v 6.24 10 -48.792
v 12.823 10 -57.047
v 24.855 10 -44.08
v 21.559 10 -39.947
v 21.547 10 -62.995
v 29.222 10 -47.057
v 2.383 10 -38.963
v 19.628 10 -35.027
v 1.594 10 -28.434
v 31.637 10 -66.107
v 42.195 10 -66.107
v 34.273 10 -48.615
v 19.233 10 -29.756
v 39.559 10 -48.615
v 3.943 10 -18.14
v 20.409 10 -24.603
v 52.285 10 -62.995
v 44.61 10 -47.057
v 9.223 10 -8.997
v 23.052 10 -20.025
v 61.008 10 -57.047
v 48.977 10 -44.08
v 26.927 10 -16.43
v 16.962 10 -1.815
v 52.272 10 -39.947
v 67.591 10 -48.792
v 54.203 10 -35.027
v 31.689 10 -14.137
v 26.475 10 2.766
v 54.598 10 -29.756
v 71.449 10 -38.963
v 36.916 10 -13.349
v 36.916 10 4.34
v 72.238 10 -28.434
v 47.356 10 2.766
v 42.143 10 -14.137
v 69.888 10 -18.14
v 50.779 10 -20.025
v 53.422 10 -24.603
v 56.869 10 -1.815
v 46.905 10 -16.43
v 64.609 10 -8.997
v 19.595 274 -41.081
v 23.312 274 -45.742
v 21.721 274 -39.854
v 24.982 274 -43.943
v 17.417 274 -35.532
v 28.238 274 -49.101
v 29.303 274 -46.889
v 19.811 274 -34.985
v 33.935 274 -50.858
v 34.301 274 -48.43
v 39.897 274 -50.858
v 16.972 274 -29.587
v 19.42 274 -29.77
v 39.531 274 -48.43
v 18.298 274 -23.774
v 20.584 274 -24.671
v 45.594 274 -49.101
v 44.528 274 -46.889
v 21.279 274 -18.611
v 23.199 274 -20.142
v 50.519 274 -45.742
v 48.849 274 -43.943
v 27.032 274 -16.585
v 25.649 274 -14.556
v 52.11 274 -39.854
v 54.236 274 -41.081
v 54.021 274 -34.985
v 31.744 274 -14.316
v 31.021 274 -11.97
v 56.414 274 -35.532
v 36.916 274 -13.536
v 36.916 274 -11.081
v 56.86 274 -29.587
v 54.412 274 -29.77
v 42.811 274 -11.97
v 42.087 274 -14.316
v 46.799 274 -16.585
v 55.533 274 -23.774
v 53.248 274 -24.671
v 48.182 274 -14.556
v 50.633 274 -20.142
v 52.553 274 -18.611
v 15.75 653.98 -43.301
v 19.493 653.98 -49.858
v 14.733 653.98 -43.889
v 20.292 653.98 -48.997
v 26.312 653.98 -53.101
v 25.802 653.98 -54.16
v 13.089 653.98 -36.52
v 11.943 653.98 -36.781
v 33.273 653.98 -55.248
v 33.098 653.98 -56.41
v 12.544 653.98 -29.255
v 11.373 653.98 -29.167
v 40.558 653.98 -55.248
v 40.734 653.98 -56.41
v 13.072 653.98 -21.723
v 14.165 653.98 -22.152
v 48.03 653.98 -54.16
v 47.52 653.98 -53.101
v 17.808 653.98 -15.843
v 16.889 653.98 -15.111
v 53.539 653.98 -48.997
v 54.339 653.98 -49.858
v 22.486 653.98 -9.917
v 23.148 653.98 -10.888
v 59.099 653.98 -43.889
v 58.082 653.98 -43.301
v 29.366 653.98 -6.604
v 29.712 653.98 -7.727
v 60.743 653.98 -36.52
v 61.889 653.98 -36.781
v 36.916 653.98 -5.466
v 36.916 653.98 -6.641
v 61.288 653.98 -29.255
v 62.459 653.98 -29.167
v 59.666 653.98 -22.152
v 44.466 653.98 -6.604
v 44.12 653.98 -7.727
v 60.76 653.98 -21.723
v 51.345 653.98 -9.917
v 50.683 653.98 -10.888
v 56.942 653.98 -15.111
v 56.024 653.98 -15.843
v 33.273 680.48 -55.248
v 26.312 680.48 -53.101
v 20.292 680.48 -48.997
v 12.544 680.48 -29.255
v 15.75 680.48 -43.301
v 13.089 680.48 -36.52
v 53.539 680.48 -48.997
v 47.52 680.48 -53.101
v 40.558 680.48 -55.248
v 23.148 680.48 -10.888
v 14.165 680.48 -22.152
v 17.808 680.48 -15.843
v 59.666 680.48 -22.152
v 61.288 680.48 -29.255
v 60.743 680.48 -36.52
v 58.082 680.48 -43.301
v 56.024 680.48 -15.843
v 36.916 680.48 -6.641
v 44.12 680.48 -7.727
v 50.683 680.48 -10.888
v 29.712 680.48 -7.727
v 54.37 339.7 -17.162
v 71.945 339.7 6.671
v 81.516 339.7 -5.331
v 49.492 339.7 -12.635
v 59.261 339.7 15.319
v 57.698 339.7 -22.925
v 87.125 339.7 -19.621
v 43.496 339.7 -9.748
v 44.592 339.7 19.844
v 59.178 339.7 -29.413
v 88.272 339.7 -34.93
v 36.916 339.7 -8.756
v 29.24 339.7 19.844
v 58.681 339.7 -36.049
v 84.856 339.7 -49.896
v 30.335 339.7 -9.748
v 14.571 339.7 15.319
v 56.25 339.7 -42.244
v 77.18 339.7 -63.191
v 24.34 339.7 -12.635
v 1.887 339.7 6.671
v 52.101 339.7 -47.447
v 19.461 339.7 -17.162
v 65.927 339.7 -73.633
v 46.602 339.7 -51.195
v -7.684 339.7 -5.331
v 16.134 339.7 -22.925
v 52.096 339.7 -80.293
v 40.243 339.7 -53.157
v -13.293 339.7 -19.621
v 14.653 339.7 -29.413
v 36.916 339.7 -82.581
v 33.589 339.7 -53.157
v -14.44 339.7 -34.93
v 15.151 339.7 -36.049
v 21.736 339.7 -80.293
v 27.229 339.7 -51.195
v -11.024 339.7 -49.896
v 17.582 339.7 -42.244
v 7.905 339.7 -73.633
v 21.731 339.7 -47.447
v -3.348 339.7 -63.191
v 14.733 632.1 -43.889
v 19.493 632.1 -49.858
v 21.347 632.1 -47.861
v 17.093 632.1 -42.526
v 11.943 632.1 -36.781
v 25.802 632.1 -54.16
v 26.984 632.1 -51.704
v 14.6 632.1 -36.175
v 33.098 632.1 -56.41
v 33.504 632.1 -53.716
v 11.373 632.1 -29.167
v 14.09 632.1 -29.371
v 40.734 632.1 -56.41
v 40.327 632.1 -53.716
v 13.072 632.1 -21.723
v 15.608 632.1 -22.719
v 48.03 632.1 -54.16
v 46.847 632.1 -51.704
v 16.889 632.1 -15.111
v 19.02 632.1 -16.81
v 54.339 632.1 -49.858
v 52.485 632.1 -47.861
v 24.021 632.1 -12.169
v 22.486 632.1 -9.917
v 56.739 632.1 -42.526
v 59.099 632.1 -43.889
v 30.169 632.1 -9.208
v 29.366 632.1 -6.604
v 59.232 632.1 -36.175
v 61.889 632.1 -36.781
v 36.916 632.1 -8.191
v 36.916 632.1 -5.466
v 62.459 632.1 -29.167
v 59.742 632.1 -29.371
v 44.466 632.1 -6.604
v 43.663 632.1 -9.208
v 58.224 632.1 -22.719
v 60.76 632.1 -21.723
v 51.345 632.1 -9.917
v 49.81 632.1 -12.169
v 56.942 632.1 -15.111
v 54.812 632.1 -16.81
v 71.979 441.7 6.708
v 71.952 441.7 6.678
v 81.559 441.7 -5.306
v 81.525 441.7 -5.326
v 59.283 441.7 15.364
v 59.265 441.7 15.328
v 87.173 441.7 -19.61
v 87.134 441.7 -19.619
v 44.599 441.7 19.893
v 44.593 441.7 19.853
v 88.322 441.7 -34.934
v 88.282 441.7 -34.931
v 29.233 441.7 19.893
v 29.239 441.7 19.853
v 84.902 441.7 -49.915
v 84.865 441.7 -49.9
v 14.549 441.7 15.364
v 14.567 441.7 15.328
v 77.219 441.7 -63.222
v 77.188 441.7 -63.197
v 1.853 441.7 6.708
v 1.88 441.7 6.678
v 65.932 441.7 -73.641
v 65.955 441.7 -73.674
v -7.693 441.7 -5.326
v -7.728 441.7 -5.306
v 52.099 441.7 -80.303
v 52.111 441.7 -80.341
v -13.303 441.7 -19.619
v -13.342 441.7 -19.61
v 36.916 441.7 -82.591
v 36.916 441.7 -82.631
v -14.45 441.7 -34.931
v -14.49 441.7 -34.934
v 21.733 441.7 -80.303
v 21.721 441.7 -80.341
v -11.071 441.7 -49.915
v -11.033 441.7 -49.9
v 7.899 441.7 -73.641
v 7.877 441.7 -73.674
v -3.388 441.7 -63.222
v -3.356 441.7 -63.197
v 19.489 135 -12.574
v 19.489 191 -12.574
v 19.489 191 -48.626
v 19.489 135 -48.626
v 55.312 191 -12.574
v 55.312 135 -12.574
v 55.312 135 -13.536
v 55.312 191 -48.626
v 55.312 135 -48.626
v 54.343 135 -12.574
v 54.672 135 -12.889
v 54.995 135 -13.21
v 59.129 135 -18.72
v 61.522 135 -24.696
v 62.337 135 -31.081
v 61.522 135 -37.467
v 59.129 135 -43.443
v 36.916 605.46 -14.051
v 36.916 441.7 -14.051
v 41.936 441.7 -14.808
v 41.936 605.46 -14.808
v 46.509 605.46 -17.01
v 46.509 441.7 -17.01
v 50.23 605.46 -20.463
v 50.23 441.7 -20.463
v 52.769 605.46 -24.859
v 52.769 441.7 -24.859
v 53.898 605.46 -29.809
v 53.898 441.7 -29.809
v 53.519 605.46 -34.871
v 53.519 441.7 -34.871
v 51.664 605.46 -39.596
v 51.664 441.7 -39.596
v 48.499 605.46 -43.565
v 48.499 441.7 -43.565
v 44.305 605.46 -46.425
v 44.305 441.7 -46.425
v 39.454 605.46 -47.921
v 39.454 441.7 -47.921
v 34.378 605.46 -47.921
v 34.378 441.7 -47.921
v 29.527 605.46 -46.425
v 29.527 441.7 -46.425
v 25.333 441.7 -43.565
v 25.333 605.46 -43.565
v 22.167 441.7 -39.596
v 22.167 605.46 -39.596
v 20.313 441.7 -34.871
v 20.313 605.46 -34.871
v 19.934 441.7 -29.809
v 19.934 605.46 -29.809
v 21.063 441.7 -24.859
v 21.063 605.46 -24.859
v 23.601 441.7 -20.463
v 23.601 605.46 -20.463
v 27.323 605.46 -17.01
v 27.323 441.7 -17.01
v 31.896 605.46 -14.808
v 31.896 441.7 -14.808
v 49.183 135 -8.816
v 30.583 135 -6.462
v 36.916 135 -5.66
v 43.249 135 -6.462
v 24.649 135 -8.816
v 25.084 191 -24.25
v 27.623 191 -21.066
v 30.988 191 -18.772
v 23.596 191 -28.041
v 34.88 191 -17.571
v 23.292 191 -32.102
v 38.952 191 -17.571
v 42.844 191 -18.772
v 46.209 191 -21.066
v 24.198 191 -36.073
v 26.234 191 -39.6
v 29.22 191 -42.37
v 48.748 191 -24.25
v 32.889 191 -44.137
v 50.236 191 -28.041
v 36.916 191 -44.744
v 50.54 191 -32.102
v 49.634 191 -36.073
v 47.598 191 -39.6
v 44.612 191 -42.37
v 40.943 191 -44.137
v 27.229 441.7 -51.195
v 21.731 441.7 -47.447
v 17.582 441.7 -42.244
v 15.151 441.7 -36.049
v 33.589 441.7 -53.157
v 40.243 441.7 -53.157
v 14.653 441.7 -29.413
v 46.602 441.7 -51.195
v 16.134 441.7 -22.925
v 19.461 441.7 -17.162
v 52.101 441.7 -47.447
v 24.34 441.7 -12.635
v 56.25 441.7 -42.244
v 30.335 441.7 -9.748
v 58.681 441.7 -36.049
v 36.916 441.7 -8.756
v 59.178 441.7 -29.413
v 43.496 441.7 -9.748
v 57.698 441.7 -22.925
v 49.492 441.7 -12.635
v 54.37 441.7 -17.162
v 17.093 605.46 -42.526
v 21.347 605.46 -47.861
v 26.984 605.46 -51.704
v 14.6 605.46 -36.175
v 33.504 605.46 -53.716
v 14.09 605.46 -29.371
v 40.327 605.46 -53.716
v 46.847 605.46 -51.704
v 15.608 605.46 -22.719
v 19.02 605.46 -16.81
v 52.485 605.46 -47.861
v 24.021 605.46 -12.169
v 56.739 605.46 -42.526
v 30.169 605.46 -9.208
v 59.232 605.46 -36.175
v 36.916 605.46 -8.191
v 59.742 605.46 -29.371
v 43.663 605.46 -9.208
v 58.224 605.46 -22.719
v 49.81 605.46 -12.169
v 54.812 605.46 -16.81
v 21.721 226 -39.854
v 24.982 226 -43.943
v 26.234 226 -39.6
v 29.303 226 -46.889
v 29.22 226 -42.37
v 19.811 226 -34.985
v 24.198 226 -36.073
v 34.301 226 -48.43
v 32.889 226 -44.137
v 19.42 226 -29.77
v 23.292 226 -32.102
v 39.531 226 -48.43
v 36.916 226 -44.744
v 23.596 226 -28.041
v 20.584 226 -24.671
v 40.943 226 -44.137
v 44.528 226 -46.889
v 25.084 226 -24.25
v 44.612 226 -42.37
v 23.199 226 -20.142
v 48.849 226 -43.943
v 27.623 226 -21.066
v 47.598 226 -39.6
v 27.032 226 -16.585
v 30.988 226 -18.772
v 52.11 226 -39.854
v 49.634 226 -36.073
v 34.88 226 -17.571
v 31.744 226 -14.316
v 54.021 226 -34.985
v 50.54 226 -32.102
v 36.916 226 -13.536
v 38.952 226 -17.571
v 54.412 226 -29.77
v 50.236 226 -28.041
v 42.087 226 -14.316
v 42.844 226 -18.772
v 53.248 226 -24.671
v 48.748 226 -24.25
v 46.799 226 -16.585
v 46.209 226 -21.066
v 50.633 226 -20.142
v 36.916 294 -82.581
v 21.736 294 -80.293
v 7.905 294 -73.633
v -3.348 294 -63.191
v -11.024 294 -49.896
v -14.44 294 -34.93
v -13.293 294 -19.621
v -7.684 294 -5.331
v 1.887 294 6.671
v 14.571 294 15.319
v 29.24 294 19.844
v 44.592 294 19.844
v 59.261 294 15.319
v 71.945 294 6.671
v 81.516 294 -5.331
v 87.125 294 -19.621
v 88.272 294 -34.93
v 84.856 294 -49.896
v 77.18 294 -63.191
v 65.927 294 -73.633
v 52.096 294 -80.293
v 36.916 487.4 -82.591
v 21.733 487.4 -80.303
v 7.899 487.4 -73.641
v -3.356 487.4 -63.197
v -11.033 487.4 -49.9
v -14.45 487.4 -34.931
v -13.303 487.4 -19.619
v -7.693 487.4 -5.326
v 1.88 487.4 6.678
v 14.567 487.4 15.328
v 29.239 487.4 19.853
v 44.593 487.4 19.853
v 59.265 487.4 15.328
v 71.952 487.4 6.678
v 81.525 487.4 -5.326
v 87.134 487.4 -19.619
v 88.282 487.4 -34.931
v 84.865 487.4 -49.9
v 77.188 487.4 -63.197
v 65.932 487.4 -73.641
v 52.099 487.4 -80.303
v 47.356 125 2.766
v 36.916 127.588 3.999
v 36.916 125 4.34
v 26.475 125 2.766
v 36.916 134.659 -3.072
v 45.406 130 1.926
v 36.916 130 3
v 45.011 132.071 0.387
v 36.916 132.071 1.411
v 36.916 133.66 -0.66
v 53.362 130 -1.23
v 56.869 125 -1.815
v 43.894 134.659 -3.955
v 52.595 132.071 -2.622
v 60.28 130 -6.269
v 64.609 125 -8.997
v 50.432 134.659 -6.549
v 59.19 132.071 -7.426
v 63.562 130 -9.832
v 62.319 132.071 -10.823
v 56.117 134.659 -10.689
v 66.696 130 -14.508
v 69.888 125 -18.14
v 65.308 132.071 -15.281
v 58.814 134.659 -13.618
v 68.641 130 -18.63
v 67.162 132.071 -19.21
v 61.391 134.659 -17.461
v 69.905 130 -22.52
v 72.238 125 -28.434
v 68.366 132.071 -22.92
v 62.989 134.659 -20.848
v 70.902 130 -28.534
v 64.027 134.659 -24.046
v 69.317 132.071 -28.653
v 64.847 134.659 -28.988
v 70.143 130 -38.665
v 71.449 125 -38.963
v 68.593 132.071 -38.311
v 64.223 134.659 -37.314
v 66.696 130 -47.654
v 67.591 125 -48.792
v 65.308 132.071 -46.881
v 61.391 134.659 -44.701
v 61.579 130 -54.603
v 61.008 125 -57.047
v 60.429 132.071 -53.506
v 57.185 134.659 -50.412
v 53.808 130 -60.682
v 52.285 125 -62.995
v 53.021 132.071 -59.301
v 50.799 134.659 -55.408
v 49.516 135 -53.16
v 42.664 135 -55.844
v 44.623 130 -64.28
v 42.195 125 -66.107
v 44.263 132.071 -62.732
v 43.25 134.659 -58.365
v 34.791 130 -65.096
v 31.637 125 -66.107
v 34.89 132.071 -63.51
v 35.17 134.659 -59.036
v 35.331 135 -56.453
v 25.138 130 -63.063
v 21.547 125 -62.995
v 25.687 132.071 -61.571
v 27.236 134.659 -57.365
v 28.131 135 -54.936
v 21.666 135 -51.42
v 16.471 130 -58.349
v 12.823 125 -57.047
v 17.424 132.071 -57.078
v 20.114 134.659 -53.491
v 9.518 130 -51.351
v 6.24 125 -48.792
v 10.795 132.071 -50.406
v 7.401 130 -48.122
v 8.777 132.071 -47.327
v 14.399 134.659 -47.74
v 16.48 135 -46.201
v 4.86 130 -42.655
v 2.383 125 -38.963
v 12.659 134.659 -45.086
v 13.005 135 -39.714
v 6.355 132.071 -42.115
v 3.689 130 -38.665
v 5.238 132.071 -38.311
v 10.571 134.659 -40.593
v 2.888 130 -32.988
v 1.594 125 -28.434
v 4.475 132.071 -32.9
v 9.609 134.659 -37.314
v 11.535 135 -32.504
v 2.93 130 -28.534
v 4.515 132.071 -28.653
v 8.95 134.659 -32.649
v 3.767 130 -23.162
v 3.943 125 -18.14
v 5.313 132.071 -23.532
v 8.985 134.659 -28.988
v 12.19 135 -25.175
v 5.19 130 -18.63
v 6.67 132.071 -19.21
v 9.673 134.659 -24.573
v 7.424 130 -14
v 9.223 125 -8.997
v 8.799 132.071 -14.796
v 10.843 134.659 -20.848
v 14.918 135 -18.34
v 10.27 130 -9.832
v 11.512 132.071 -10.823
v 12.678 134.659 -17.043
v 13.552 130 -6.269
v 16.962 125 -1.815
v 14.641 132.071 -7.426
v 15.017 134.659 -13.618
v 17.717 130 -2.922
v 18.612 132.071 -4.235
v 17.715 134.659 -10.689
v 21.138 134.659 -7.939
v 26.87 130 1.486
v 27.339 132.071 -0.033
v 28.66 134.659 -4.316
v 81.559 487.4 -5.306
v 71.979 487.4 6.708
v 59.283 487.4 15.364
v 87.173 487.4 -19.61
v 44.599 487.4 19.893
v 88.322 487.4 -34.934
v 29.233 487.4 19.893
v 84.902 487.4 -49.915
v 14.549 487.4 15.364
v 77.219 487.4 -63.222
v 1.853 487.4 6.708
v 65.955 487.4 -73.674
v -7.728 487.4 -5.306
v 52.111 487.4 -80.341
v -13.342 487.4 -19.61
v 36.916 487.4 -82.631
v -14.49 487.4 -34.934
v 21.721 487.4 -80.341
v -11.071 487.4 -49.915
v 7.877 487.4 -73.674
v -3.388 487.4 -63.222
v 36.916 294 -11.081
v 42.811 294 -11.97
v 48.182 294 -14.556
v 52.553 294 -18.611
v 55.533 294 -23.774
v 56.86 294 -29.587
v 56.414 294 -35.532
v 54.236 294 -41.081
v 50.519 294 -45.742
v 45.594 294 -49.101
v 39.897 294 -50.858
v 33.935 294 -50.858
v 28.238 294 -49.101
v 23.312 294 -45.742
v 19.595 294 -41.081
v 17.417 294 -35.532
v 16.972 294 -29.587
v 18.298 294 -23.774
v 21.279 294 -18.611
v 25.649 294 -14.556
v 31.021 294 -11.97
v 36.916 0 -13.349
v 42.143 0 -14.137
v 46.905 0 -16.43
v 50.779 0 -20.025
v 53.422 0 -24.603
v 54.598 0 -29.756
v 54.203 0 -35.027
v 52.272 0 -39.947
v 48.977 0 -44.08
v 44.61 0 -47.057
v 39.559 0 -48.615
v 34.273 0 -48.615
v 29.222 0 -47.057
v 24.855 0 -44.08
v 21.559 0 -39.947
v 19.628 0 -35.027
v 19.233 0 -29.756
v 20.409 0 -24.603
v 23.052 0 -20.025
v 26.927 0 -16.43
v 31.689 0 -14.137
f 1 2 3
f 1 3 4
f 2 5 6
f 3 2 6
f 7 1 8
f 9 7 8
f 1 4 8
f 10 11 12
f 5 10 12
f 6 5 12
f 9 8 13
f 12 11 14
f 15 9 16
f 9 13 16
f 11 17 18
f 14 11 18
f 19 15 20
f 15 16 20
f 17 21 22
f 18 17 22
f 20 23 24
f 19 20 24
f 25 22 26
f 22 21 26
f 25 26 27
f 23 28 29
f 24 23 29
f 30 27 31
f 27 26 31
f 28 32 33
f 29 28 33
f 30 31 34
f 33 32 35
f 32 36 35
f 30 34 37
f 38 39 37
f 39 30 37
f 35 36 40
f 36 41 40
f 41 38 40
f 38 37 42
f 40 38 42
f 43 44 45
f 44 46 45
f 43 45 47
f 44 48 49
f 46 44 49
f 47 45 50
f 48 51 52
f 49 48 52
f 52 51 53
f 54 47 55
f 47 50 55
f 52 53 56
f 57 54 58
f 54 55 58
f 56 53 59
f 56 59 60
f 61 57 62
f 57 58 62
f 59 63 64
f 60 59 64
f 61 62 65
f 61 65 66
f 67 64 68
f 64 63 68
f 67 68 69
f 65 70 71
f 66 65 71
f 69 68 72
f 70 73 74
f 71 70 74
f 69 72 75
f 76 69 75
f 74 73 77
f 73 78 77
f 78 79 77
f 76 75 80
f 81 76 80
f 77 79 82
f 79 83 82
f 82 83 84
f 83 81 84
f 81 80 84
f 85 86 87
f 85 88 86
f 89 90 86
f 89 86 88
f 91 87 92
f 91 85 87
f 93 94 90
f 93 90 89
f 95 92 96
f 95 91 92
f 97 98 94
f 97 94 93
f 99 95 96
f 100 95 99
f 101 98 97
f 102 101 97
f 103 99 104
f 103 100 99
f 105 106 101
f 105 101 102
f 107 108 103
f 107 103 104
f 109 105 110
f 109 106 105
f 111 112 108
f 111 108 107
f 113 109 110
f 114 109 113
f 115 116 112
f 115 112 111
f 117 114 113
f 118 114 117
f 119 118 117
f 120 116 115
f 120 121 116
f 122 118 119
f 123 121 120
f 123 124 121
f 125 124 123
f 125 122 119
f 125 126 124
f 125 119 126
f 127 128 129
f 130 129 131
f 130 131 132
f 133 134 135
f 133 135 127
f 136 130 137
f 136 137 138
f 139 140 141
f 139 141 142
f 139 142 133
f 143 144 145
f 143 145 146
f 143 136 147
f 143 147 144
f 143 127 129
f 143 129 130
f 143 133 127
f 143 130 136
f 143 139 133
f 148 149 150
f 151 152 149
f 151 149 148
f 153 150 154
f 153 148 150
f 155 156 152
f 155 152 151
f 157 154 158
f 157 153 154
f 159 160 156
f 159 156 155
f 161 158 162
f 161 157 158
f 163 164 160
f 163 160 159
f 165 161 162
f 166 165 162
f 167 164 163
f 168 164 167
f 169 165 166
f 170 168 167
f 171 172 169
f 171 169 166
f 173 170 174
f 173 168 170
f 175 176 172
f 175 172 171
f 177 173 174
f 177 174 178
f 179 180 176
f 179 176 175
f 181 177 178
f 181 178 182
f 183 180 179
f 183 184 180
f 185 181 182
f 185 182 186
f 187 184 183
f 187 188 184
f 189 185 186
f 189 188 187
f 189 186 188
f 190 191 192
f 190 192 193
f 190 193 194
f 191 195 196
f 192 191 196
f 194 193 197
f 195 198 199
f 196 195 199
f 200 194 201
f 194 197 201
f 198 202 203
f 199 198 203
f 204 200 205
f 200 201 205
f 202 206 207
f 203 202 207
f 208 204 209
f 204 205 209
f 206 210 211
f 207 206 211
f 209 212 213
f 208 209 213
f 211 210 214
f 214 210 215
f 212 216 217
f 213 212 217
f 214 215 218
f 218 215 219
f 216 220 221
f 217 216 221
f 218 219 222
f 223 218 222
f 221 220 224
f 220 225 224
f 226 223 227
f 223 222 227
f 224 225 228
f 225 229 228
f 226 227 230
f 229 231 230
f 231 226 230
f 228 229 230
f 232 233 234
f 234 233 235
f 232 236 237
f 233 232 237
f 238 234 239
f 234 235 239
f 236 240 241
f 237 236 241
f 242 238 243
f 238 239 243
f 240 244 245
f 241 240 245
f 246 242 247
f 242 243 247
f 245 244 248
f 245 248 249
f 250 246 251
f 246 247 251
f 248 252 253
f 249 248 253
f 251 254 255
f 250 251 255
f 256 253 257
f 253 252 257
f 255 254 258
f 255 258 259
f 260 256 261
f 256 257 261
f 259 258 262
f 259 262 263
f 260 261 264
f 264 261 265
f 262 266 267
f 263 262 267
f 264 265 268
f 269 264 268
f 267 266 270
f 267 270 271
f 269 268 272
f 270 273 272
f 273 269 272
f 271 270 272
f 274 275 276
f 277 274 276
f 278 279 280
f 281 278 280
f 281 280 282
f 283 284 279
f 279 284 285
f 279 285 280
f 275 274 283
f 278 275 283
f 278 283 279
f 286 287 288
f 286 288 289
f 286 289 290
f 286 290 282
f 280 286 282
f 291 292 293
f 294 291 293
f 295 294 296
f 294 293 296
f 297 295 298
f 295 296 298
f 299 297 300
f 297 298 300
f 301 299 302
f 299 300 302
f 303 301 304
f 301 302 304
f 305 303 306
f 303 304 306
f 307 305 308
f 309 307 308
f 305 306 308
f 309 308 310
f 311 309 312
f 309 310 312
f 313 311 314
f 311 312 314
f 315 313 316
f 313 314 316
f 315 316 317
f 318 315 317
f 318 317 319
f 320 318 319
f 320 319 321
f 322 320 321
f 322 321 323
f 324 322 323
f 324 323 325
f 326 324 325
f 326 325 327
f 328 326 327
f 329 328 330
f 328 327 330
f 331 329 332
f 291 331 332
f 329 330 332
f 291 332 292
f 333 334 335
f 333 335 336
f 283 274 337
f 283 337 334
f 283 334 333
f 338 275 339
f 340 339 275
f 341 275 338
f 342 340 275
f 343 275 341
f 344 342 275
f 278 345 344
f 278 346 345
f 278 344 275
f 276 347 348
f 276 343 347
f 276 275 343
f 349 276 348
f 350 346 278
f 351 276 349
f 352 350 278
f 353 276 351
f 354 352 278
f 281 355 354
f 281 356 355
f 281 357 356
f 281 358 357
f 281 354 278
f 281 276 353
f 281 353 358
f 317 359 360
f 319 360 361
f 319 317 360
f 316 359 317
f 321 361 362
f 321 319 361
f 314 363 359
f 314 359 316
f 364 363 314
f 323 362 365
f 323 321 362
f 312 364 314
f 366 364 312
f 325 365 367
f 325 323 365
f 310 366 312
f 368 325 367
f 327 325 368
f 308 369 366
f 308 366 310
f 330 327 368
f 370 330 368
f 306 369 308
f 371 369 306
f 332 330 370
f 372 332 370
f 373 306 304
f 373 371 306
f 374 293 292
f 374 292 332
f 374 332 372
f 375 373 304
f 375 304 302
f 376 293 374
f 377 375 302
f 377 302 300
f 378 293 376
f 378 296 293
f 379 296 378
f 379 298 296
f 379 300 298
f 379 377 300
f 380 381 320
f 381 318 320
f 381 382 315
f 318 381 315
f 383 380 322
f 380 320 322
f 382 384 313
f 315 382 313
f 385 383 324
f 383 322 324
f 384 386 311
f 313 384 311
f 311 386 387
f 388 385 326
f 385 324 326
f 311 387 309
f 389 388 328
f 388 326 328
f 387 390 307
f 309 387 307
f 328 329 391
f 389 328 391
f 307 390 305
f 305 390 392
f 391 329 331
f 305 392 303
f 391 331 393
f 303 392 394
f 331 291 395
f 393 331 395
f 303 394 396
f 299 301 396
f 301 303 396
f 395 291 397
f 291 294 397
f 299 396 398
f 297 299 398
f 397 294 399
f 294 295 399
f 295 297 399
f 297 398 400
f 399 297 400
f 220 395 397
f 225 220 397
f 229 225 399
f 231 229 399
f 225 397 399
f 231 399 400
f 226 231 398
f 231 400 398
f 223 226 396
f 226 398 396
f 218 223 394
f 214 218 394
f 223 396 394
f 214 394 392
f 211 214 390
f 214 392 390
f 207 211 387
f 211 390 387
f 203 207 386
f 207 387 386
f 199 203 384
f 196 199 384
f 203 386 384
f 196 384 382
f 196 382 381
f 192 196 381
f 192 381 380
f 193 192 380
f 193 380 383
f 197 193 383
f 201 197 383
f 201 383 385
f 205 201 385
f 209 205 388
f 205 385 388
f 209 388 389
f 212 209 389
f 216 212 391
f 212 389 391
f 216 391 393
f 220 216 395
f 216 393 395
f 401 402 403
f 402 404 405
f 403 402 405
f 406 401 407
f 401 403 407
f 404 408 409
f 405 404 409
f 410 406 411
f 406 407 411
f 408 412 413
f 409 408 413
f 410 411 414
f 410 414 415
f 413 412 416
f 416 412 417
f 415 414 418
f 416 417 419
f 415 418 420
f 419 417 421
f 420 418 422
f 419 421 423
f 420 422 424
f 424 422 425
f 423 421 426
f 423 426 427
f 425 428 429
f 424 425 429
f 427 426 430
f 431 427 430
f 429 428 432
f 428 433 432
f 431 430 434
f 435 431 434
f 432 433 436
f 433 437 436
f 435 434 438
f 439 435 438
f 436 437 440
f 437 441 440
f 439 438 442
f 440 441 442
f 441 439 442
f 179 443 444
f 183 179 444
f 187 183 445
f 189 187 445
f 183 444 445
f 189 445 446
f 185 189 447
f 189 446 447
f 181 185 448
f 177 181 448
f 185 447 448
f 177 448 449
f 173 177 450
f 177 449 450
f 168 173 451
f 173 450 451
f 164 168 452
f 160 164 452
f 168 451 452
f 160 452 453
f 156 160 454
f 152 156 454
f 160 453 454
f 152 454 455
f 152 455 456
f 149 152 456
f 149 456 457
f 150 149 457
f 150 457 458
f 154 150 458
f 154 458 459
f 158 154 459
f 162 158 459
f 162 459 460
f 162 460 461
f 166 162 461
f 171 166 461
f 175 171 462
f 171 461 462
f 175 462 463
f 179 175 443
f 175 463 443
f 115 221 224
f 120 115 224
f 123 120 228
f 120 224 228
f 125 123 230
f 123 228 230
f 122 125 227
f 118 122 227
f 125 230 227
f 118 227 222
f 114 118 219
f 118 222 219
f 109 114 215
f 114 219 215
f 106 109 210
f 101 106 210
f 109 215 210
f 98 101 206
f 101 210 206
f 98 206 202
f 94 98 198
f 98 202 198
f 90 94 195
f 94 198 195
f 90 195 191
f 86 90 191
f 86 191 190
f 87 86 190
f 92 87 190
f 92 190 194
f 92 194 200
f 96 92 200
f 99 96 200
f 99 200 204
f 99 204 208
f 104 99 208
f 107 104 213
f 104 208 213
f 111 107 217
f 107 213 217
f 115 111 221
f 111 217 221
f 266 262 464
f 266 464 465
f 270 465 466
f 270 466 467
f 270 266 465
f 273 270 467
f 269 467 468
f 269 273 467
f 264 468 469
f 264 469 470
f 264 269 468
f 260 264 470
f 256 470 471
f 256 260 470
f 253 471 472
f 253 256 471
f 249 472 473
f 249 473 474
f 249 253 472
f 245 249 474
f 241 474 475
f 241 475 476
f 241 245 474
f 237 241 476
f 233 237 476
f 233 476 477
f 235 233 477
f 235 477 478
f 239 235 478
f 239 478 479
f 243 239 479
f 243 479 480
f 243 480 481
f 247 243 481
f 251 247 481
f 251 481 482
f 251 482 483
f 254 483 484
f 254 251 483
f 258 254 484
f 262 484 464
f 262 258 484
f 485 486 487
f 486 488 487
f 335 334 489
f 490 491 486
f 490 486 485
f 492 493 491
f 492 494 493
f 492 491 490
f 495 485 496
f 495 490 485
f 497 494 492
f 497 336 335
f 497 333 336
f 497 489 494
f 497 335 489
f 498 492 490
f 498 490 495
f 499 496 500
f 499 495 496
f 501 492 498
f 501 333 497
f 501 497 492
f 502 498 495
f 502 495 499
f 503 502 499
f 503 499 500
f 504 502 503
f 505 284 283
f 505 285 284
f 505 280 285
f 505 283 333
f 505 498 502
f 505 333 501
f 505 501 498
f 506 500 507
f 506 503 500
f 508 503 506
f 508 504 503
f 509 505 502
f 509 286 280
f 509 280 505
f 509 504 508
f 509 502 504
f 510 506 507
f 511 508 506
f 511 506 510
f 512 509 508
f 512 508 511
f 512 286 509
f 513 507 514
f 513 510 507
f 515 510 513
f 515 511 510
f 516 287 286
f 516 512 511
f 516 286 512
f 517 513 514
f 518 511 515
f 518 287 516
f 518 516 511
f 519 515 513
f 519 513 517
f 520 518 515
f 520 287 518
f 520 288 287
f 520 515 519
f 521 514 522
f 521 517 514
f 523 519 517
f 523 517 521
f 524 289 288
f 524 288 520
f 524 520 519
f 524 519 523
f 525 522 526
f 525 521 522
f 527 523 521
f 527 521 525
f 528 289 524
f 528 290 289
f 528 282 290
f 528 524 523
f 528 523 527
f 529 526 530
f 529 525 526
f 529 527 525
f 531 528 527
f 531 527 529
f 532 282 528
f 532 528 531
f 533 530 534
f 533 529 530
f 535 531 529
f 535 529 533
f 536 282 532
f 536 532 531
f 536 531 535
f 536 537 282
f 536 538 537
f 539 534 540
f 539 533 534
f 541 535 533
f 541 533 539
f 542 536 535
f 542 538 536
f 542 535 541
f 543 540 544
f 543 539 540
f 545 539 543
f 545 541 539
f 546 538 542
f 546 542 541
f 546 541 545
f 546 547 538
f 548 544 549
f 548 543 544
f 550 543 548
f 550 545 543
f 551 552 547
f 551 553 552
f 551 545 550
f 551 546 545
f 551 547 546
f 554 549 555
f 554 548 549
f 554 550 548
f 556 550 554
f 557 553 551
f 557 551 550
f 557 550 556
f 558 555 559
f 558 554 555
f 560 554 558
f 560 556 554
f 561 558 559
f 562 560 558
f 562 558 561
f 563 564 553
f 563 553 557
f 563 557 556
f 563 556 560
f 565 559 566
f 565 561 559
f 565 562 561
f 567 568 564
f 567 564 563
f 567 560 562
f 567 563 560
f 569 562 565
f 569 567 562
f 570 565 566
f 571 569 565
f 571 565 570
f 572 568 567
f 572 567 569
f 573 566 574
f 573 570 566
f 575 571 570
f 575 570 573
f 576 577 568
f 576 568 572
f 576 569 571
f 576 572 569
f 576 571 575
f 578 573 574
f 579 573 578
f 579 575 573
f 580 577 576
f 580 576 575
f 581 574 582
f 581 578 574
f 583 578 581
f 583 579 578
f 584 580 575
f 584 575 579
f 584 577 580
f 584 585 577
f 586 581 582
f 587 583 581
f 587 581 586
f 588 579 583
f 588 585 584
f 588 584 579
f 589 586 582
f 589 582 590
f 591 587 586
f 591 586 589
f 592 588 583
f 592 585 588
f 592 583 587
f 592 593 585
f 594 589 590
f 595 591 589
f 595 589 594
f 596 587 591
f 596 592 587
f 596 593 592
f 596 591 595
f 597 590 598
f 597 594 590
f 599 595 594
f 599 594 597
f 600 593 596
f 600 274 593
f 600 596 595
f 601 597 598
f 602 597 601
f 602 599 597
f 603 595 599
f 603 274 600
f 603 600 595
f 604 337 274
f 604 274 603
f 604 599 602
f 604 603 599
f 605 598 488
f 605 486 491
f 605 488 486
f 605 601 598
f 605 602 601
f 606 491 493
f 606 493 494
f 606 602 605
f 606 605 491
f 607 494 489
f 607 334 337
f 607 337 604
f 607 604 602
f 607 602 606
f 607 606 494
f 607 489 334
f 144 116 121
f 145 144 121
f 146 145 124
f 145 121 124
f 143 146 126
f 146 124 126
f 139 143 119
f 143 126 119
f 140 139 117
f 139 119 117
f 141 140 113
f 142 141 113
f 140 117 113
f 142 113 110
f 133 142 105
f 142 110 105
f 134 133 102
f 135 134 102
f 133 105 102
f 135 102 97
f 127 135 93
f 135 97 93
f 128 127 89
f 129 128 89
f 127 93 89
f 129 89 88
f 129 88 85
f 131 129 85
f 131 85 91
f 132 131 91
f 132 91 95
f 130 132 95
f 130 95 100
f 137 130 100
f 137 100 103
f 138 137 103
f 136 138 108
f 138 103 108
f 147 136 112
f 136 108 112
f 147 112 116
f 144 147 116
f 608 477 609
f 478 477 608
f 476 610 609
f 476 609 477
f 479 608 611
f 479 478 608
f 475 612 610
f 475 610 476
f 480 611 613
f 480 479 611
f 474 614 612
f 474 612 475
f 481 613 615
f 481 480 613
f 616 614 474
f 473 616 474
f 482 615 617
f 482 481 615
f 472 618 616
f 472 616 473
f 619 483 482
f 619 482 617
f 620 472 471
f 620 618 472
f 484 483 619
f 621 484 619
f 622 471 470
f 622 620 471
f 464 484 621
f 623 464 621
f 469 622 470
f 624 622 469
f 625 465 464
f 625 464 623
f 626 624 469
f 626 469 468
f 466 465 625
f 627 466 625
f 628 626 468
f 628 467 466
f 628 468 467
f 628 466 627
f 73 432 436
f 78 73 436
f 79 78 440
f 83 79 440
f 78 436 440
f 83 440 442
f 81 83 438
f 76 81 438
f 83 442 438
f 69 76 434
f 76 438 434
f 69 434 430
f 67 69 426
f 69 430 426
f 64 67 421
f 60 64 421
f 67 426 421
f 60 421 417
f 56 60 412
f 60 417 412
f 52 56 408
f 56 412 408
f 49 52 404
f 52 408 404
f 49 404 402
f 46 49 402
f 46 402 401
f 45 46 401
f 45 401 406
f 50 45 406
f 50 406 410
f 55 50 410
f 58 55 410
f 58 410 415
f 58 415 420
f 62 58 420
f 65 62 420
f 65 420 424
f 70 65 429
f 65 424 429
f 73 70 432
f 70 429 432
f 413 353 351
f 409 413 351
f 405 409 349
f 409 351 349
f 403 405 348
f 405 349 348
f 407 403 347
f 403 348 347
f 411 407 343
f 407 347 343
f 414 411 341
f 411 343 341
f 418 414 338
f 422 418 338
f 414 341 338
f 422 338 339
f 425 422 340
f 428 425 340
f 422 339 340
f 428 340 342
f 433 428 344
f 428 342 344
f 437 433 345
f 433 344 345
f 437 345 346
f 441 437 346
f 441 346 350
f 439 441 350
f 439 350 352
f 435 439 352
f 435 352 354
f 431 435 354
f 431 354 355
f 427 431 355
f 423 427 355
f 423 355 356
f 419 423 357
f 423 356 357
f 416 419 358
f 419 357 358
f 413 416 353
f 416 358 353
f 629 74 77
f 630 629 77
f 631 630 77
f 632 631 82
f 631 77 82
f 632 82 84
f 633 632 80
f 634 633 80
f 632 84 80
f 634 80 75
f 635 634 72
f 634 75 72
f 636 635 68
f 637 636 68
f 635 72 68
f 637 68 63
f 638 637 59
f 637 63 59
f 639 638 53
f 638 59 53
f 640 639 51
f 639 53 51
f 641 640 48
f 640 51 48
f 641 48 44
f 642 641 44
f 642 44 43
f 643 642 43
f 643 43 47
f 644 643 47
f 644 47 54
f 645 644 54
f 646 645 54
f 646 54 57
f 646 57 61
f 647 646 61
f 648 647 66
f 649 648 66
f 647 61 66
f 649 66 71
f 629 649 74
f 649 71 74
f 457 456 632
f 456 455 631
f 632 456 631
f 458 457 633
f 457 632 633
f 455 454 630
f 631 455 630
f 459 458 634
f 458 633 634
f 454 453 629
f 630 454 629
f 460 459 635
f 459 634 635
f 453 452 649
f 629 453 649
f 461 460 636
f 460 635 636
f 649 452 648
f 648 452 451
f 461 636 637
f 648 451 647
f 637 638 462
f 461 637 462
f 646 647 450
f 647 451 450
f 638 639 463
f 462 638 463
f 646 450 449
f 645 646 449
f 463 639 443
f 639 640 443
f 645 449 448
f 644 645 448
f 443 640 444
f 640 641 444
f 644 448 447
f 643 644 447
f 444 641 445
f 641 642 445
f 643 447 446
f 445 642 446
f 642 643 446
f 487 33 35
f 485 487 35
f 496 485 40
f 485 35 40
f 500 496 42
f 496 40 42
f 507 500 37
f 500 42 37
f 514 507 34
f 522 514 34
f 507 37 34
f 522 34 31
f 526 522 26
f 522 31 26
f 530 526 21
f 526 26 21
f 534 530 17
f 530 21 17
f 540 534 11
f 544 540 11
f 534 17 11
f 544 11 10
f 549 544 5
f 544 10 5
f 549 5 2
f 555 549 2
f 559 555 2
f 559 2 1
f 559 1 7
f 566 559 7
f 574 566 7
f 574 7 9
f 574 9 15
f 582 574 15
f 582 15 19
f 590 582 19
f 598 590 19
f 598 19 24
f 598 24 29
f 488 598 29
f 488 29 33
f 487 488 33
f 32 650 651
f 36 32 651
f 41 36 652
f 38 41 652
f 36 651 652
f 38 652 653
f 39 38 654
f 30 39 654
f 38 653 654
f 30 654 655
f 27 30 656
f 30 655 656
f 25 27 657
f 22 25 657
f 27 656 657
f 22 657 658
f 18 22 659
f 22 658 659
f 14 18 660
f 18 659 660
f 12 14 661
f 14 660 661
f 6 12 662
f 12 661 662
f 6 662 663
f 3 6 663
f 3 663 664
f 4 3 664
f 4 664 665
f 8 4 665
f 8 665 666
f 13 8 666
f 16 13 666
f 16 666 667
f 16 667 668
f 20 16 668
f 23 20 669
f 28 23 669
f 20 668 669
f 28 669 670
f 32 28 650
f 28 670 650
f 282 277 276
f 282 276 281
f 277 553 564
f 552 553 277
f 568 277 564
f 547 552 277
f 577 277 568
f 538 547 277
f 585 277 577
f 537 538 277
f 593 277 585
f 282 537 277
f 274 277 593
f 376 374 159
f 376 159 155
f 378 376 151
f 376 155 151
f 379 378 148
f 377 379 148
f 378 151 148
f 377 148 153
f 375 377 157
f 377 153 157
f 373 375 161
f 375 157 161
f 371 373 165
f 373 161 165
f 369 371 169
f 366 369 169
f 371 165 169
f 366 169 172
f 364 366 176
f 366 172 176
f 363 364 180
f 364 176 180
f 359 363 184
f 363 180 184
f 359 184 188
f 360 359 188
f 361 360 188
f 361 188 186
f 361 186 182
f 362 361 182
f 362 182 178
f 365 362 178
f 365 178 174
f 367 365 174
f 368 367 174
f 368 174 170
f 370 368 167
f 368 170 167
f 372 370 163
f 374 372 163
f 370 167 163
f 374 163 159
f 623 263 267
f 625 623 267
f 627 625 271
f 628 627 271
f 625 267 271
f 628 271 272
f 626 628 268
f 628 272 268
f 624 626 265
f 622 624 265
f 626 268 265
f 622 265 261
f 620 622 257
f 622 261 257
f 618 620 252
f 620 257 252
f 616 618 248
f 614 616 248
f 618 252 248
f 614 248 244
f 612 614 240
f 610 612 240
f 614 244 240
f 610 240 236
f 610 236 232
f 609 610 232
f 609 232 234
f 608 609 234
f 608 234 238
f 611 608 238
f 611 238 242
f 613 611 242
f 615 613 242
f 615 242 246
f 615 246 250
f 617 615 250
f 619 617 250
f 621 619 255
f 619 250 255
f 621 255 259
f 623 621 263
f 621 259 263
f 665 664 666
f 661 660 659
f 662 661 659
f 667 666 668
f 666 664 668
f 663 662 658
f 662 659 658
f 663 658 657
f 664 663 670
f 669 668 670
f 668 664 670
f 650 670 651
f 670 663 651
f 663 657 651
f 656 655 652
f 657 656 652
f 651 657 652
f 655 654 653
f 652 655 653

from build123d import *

# Parameters (mm, degrees)
SKETCH_6_R       = 17.732160556
EXTRUDE_4_DEPTH  = 10
SKETCH_7_R       = 35.421112471
EXTRUDE_5_DEPTH  = 95
SKETCH_8_R       = 35.421112471
EXTRUDE_6_DEPTH  = 30
FILLET_1_R       = 10
SKETCH_9_W       = 35.822826906
SKETCH_9_H       = 36.052621251
EXTRUDE_7_DEPTH  = 56
SKETCH_10_R      = 13.662426113
EXTRUDE_8_DEPTH  = 35
SKETCH_11_R      = 17.544973597
EXTRUDE_9_DEPTH  = 48
SKETCH_12_R      = 12.5
EXTRUDE_10_DEPTH = 20
SKETCH_14_R      = 20
EXTRUDE_12_DEPTH = 20
SKETCH_13_R      = 49
SKETCH_13_R_2    = 36
EXTRUDE_13_DEPTH = 20
SKETCH_15_R      = 51.5
EXTRUDE_14_DEPTH = 45.7
SKETCH_16_R      = 22.325
EXTRUDE_17_DEPTH = 102
SKETCH_17_R      = 51.55
SKETCH_17_R_2    = 51.51
EXTRUDE_19_DEPTH = 45.7
SKETCH_18_R      = 17.03
EXTRUDE_20_DEPTH = 163.76
SKETCH_19_R      = 22.89
EXTRUDE_21_DEPTH = 26.64
SKETCH_20_R      = 25.615
EXTRUDE_22_DEPTH = 21.88
SKETCH_21_R      = 24.44
EXTRUDE_23_DEPTH = 26.5


with BuildPart() as part:
    # 草图6 → 凸台-拉伸4 (new body)
    with BuildSketch(Plane(origin=(0, 0, 0), x_dir=(1, 0, 0), z_dir=(0, 1, 0))):
        with Locations(Location((36.915881384, 31.081219188, 0), (0, 0, 270))):
            Circle(SKETCH_6_R)
    extrude(amount=EXTRUDE_4_DEPTH)

    # 草图7 → 凸台-拉伸5 (add)
    with BuildSketch(Plane(origin=(0, 10, 0), x_dir=(1, 0, 0), z_dir=(0, 1, 0))):
        with Locations(Location((36.915881384, 31.081219188, 0), (0, 0, 270))):
            Circle(SKETCH_7_R)
    extrude(amount=EXTRUDE_5_DEPTH)

    # 草图8 → 凸台-拉伸6 (add)
    with BuildSketch(Plane(origin=(0, 105, 0), x_dir=(1, 0, 0), z_dir=(0, 1, 0))):
        with Locations(Location((36.915881384, 31.081219188, 0), (0, 0, 270))):
            Circle(SKETCH_8_R)
    extrude(amount=EXTRUDE_6_DEPTH)

    # 圆角1
    fillet_1_edges = [part.edges().sort_by_distance(p)[0] for p in [
        (36.915881384, 135, -66.502331659),
    ]]
    fillet(fillet_1_edges, radius=FILLET_1_R)

    # 草图9 → 凸台-拉伸7 (add)
    with BuildSketch(Plane(origin=(0, 135, 0), x_dir=(1, 0, 0), z_dir=(0, 1, 0))):
        with Locations((37.400306067, 30.59988216)):
            Rectangle(SKETCH_9_W, SKETCH_9_H)
    extrude(amount=EXTRUDE_7_DEPTH)

    # 草图10 → 凸台-拉伸8 (add)
    with BuildSketch(Plane(origin=(0, 191, 0), x_dir=(1, 0, 0), z_dir=(0, 1, 0))):
        with Locations(Location((36.915881384, 31.081219188, 0), (0, 0, 90))):
            Circle(SKETCH_10_R)
    extrude(amount=EXTRUDE_8_DEPTH)

    # 草图11 → 凸台-拉伸9 (add)
    with BuildSketch(Plane(origin=(0, 226, 0), x_dir=(1, 0, 0), z_dir=(0, 1, 0))):
        with Locations(Location((36.915881384, 31.081219188, 0), (0, 0, 270))):
            Circle(SKETCH_11_R)
    extrude(amount=EXTRUDE_9_DEPTH)

    # 草图12 → 凸台-拉伸10 (add)
    with BuildSketch(Plane(origin=(0, 274, 0), x_dir=(1, 0, 0), z_dir=(0, 1, 0))):
        with Locations(Location((36.915881384, 31.081219188, 0), (0, 0, 270))):
            Circle(SKETCH_12_R)
    extrude(amount=EXTRUDE_10_DEPTH)

    # 草图14 → 凸台-拉伸12 (add)
    with BuildSketch(Plane(origin=(0, 274, 0), x_dir=(1, 0, 0), z_dir=(0, 1, 0))):
        with Locations(Location((36.915881384, 31.081219188, 0), (0, 0, 270))):
            Circle(SKETCH_14_R)
    extrude(amount=EXTRUDE_12_DEPTH)



with BuildPart() as body_2:
    # 草图13 → 凸台-拉伸13 (new body)
    with BuildSketch(Plane(origin=(0, 294, 0), x_dir=(1, 0, 0), z_dir=(0, 1, 0))):
        with Locations(Location((36.915881384, 31.081219188, 0), (0, 0, 270))):
            Circle(SKETCH_13_R)
        with Locations(Location((36.915881384, 31.081219188, 0), (0, 0, 270))):
            Circle(SKETCH_13_R_2, mode=Mode.SUBTRACT)
    extrude(amount=EXTRUDE_13_DEPTH)


with BuildPart() as part_1:
    add(part.part)

    add(body_2.part)  # 凸台-拉伸14 merges body 2
    # 草图15 → 凸台-拉伸14 (add)
    with BuildSketch(Plane(origin=(0, 294, 0), x_dir=(1, 0, 0), z_dir=(0, 1, 0))):
        with Locations(Location((36.915881384, 31.081219188, 0), (0, 0, 90))):
            Circle(SKETCH_15_R)
    extrude(amount=EXTRUDE_14_DEPTH)

    # 草图16 → 凸台-拉伸17 (add)
    with BuildSketch(Plane(origin=(0, 339.7, 0), x_dir=(1, 0, 0), z_dir=(0, 1, 0))):
        with Locations(Location((36.915881384, 31.081219188, 0), (0, 0, 270))):
            Circle(SKETCH_16_R)
    extrude(amount=EXTRUDE_17_DEPTH)

    # 草图18 → 凸台-拉伸20 (add)
    with BuildSketch(Plane(origin=(0, 441.7, 0), x_dir=(1, 0, 0), z_dir=(0, 1, 0))):
        with Locations(Location((36.915881384, 31.081219188, 0), (0, 0, 270))):
            Circle(SKETCH_18_R)
    extrude(amount=EXTRUDE_20_DEPTH)

    # 草图19 → 凸台-拉伸21 (add)
    with BuildSketch(Plane(origin=(0, 605.46, 0), x_dir=(1, 0, 0), z_dir=(0, 1, 0))):
        with Locations(Location((36.915881384, 31.081219188, 0), (0, 0, 270))):
            Circle(SKETCH_19_R)
    extrude(amount=EXTRUDE_21_DEPTH)

    # 草图20 → 凸台-拉伸22 (add)
    with BuildSketch(Plane(origin=(0, 632.1, 0), x_dir=(1, 0, 0), z_dir=(0, 1, 0))):
        with Locations(Location((36.915881384, 31.081219188, 0), (0, 0, 270))):
            Circle(SKETCH_20_R)
    extrude(amount=EXTRUDE_22_DEPTH)

    # 草图21 → 凸台-拉伸23 (add)
    with BuildSketch(Plane(origin=(0, 653.98, 0), x_dir=(1, 0, 0), z_dir=(0, 1, 0))):
        with Locations(Location((36.915881384, 31.081219188, 0), (0, 0, 270))):
            Circle(SKETCH_21_R)
    extrude(amount=EXTRUDE_23_DEPTH)


with BuildPart() as body_2_2:
    # 草图17 → 凸台-拉伸19 (new body)
    with BuildSketch(Plane(origin=(0, 441.7, 0), x_dir=(1, 0, 0), z_dir=(0, 1, 0))):
        with Locations(Location((36.915881384, 31.081219188, 0), (0, 0, 90))):
            Circle(SKETCH_17_R)
        with Locations(Location((36.915881384, 31.081219188, 0), (0, 0, 90))):
            Circle(SKETCH_17_R_2, mode=Mode.SUBTRACT)
    extrude(amount=EXTRUDE_19_DEPTH)


solid = Compound([part_1.part, body_2_2.part])
